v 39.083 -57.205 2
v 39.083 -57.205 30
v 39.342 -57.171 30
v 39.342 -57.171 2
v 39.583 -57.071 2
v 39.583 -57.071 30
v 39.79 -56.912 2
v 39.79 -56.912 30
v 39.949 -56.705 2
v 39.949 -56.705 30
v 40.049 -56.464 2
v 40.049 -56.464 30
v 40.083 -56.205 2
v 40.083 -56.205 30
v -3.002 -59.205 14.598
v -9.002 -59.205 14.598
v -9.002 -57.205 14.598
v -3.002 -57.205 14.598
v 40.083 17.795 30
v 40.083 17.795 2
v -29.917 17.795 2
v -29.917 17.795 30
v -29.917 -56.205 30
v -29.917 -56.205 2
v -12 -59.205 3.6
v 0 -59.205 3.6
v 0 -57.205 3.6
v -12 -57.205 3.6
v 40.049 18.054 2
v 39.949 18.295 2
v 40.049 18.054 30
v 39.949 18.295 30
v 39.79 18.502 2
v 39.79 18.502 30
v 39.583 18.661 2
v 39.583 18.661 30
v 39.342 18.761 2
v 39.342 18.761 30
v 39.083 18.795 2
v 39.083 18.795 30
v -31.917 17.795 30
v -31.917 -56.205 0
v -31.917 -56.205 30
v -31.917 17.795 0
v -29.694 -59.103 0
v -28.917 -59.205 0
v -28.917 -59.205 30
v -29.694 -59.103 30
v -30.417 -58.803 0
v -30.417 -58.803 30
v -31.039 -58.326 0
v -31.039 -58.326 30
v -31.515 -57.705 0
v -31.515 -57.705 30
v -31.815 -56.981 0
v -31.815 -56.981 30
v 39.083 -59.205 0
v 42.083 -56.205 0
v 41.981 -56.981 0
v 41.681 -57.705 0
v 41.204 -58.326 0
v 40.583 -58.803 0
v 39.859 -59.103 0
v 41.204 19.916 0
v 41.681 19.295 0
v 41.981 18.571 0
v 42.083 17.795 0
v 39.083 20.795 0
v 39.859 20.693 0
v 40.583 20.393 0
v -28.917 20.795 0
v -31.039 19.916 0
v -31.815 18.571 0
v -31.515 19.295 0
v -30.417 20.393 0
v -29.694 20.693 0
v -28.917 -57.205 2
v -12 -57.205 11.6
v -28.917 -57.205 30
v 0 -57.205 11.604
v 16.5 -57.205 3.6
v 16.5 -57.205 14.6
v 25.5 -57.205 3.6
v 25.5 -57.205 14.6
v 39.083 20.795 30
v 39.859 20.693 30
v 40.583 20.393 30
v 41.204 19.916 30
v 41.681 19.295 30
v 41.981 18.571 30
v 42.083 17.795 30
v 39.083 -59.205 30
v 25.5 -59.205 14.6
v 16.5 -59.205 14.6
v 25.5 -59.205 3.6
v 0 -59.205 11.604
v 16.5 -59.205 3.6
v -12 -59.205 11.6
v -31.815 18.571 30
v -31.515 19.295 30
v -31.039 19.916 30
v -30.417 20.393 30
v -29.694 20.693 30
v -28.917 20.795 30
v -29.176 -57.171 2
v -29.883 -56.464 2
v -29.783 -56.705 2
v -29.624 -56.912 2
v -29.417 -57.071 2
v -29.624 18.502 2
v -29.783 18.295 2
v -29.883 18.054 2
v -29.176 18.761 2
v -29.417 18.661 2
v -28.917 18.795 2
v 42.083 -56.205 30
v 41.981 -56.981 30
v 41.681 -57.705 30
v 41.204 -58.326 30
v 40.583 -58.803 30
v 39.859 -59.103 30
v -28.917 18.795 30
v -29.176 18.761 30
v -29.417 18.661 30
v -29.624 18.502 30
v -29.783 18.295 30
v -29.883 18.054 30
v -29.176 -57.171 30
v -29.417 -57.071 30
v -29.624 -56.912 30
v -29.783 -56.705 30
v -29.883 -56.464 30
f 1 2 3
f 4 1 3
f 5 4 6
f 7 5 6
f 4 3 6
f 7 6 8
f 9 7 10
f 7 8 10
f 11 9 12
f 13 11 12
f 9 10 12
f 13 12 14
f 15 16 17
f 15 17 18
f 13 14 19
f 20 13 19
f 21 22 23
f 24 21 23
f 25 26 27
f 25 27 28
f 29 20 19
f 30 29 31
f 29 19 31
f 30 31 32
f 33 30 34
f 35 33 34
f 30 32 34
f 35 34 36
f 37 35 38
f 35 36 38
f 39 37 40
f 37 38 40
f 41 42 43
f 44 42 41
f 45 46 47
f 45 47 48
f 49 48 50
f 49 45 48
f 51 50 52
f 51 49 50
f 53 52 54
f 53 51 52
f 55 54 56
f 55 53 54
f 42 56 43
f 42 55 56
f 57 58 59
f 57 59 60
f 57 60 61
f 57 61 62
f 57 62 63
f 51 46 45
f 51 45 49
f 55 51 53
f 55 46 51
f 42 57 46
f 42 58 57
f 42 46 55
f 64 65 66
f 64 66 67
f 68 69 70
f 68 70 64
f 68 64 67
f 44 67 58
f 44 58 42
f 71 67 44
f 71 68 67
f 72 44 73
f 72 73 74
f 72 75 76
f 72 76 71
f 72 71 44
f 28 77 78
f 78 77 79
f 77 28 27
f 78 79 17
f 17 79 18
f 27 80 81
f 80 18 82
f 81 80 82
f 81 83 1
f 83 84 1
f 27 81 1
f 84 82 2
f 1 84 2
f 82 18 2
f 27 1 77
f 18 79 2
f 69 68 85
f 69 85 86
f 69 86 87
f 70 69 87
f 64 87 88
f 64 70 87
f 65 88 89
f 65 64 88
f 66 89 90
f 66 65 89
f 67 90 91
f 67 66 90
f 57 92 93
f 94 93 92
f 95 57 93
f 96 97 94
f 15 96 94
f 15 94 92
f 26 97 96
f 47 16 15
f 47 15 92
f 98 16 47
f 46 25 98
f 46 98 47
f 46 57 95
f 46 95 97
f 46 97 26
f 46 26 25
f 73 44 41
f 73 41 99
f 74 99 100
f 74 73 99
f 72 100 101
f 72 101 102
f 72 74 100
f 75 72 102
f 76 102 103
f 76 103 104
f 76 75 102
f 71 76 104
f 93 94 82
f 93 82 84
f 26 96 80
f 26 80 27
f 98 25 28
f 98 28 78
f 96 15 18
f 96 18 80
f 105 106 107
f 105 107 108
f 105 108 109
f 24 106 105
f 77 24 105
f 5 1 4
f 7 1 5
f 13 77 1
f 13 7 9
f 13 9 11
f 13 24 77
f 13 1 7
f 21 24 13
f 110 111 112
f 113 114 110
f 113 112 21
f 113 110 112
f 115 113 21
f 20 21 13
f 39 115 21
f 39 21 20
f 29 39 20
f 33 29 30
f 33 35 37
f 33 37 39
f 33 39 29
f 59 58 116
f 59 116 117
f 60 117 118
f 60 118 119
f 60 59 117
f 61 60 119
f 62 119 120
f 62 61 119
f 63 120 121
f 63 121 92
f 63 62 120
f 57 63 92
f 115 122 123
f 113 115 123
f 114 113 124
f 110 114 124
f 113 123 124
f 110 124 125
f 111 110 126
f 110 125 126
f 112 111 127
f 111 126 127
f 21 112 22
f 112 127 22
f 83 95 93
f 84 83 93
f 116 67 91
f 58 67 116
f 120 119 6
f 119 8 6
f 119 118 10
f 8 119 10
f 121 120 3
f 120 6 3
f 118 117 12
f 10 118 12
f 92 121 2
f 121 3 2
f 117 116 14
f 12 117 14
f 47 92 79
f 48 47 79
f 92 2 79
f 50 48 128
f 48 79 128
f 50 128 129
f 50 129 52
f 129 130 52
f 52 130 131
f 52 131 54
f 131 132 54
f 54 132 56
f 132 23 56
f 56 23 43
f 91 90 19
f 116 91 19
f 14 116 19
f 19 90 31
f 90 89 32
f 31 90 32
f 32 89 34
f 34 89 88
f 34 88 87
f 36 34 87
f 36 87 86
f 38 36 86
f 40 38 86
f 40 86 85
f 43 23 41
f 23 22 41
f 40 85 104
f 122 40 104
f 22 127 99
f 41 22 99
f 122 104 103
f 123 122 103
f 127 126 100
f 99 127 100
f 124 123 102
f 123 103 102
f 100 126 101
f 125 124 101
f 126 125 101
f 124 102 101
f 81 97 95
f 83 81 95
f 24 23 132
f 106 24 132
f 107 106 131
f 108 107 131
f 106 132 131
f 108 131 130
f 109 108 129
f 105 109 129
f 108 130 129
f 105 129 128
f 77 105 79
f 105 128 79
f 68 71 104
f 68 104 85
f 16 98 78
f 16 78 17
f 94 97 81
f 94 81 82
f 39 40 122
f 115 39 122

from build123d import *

# Parameters (mm, degrees)
BOSS_EXTRUDE2_DEPTH = 30
CUT_EXTRUDE3_DEPTH  = 28
SKETCH10_W          = 9
SKETCH10_H          = 11
CUT_EXTRUDE4_DEPTH  = 3


with BuildPart() as part:
    # Sketch2 → Boss-Extrude2 (new body)
    with BuildSketch(Plane.XY):
        with BuildLine():
            Line((-28.917214192, 20.79500657), (39.082785808, 20.79500657))
            ThreePointArc((39.082785808, 20.79500657), (41.204106152, 19.916326914), (42.082785808, 17.79500657))
            Line((42.082785808, 17.79500657), (42.082785808, -56.20499343))
            ThreePointArc((42.082785808, -56.20499343), (41.204106152, -58.326313773), (39.082785808, -59.20499343))
            Line((39.082785808, -59.20499343), (-28.917214192, -59.20499343))
            ThreePointArc((-28.917214192, -59.20499343), (-31.038534535, -58.326313773), (-31.917214192, -56.20499343))
            Line((-31.917214192, -56.20499343), (-31.917214192, 17.79500657))
            ThreePointArc((-31.917214192, 17.79500657), (-31.038534535, 19.916326914), (-28.917214192, 20.79500657))
        make_face()
    extrude(amount=BOSS_EXTRUDE2_DEPTH)

    # Sketch7 → Cut-Extrude3 (cut)
    with BuildSketch(Plane.XY.offset(30)):
        with BuildLine():
            Line((-28.917214192, -57.20499343), (39.082785808, -57.20499343))
            ThreePointArc((39.082785808, -57.20499343), (39.789892589, -56.912100211), (40.082785808, -56.20499343))
            Line((40.082785808, -56.20499343), (40.082785808, 17.79500657))
            ThreePointArc((40.082785808, 17.79500657), (39.789892589, 18.502113351), (39.082785808, 18.79500657))
            Line((39.082785808, 18.79500657), (-28.917214192, 18.79500657))
            ThreePointArc((-28.917214192, 18.79500657), (-29.624320973, 18.502113351), (-29.917214192, 17.79500657))
            Line((-29.917214192, 17.79500657), (-29.917214192, -56.20499343))
            ThreePointArc((-29.917214192, -56.20499343), (-29.624320973, -56.912100211), (-28.917214192, -57.20499343))
        make_face()
    extrude(amount=-CUT_EXTRUDE3_DEPTH, mode=Mode.SUBTRACT)

    # Sketch10 → Cut-Extrude4 (cut)
    with BuildSketch(Plane.XZ.offset(59.20499343)):
        Polygon((-12, 11.6), (-9.001867248, 14.598132752), (-3.001867248, 14.598132752), (0, 11.603739153), (0, 3.6), (-12, 3.6), align=None)
        with Locations((21, 9.1)):
            Rectangle(SKETCH10_W, SKETCH10_H)
    extrude(amount=-CUT_EXTRUDE4_DEPTH, mode=Mode.SUBTRACT)


solid = part.part
